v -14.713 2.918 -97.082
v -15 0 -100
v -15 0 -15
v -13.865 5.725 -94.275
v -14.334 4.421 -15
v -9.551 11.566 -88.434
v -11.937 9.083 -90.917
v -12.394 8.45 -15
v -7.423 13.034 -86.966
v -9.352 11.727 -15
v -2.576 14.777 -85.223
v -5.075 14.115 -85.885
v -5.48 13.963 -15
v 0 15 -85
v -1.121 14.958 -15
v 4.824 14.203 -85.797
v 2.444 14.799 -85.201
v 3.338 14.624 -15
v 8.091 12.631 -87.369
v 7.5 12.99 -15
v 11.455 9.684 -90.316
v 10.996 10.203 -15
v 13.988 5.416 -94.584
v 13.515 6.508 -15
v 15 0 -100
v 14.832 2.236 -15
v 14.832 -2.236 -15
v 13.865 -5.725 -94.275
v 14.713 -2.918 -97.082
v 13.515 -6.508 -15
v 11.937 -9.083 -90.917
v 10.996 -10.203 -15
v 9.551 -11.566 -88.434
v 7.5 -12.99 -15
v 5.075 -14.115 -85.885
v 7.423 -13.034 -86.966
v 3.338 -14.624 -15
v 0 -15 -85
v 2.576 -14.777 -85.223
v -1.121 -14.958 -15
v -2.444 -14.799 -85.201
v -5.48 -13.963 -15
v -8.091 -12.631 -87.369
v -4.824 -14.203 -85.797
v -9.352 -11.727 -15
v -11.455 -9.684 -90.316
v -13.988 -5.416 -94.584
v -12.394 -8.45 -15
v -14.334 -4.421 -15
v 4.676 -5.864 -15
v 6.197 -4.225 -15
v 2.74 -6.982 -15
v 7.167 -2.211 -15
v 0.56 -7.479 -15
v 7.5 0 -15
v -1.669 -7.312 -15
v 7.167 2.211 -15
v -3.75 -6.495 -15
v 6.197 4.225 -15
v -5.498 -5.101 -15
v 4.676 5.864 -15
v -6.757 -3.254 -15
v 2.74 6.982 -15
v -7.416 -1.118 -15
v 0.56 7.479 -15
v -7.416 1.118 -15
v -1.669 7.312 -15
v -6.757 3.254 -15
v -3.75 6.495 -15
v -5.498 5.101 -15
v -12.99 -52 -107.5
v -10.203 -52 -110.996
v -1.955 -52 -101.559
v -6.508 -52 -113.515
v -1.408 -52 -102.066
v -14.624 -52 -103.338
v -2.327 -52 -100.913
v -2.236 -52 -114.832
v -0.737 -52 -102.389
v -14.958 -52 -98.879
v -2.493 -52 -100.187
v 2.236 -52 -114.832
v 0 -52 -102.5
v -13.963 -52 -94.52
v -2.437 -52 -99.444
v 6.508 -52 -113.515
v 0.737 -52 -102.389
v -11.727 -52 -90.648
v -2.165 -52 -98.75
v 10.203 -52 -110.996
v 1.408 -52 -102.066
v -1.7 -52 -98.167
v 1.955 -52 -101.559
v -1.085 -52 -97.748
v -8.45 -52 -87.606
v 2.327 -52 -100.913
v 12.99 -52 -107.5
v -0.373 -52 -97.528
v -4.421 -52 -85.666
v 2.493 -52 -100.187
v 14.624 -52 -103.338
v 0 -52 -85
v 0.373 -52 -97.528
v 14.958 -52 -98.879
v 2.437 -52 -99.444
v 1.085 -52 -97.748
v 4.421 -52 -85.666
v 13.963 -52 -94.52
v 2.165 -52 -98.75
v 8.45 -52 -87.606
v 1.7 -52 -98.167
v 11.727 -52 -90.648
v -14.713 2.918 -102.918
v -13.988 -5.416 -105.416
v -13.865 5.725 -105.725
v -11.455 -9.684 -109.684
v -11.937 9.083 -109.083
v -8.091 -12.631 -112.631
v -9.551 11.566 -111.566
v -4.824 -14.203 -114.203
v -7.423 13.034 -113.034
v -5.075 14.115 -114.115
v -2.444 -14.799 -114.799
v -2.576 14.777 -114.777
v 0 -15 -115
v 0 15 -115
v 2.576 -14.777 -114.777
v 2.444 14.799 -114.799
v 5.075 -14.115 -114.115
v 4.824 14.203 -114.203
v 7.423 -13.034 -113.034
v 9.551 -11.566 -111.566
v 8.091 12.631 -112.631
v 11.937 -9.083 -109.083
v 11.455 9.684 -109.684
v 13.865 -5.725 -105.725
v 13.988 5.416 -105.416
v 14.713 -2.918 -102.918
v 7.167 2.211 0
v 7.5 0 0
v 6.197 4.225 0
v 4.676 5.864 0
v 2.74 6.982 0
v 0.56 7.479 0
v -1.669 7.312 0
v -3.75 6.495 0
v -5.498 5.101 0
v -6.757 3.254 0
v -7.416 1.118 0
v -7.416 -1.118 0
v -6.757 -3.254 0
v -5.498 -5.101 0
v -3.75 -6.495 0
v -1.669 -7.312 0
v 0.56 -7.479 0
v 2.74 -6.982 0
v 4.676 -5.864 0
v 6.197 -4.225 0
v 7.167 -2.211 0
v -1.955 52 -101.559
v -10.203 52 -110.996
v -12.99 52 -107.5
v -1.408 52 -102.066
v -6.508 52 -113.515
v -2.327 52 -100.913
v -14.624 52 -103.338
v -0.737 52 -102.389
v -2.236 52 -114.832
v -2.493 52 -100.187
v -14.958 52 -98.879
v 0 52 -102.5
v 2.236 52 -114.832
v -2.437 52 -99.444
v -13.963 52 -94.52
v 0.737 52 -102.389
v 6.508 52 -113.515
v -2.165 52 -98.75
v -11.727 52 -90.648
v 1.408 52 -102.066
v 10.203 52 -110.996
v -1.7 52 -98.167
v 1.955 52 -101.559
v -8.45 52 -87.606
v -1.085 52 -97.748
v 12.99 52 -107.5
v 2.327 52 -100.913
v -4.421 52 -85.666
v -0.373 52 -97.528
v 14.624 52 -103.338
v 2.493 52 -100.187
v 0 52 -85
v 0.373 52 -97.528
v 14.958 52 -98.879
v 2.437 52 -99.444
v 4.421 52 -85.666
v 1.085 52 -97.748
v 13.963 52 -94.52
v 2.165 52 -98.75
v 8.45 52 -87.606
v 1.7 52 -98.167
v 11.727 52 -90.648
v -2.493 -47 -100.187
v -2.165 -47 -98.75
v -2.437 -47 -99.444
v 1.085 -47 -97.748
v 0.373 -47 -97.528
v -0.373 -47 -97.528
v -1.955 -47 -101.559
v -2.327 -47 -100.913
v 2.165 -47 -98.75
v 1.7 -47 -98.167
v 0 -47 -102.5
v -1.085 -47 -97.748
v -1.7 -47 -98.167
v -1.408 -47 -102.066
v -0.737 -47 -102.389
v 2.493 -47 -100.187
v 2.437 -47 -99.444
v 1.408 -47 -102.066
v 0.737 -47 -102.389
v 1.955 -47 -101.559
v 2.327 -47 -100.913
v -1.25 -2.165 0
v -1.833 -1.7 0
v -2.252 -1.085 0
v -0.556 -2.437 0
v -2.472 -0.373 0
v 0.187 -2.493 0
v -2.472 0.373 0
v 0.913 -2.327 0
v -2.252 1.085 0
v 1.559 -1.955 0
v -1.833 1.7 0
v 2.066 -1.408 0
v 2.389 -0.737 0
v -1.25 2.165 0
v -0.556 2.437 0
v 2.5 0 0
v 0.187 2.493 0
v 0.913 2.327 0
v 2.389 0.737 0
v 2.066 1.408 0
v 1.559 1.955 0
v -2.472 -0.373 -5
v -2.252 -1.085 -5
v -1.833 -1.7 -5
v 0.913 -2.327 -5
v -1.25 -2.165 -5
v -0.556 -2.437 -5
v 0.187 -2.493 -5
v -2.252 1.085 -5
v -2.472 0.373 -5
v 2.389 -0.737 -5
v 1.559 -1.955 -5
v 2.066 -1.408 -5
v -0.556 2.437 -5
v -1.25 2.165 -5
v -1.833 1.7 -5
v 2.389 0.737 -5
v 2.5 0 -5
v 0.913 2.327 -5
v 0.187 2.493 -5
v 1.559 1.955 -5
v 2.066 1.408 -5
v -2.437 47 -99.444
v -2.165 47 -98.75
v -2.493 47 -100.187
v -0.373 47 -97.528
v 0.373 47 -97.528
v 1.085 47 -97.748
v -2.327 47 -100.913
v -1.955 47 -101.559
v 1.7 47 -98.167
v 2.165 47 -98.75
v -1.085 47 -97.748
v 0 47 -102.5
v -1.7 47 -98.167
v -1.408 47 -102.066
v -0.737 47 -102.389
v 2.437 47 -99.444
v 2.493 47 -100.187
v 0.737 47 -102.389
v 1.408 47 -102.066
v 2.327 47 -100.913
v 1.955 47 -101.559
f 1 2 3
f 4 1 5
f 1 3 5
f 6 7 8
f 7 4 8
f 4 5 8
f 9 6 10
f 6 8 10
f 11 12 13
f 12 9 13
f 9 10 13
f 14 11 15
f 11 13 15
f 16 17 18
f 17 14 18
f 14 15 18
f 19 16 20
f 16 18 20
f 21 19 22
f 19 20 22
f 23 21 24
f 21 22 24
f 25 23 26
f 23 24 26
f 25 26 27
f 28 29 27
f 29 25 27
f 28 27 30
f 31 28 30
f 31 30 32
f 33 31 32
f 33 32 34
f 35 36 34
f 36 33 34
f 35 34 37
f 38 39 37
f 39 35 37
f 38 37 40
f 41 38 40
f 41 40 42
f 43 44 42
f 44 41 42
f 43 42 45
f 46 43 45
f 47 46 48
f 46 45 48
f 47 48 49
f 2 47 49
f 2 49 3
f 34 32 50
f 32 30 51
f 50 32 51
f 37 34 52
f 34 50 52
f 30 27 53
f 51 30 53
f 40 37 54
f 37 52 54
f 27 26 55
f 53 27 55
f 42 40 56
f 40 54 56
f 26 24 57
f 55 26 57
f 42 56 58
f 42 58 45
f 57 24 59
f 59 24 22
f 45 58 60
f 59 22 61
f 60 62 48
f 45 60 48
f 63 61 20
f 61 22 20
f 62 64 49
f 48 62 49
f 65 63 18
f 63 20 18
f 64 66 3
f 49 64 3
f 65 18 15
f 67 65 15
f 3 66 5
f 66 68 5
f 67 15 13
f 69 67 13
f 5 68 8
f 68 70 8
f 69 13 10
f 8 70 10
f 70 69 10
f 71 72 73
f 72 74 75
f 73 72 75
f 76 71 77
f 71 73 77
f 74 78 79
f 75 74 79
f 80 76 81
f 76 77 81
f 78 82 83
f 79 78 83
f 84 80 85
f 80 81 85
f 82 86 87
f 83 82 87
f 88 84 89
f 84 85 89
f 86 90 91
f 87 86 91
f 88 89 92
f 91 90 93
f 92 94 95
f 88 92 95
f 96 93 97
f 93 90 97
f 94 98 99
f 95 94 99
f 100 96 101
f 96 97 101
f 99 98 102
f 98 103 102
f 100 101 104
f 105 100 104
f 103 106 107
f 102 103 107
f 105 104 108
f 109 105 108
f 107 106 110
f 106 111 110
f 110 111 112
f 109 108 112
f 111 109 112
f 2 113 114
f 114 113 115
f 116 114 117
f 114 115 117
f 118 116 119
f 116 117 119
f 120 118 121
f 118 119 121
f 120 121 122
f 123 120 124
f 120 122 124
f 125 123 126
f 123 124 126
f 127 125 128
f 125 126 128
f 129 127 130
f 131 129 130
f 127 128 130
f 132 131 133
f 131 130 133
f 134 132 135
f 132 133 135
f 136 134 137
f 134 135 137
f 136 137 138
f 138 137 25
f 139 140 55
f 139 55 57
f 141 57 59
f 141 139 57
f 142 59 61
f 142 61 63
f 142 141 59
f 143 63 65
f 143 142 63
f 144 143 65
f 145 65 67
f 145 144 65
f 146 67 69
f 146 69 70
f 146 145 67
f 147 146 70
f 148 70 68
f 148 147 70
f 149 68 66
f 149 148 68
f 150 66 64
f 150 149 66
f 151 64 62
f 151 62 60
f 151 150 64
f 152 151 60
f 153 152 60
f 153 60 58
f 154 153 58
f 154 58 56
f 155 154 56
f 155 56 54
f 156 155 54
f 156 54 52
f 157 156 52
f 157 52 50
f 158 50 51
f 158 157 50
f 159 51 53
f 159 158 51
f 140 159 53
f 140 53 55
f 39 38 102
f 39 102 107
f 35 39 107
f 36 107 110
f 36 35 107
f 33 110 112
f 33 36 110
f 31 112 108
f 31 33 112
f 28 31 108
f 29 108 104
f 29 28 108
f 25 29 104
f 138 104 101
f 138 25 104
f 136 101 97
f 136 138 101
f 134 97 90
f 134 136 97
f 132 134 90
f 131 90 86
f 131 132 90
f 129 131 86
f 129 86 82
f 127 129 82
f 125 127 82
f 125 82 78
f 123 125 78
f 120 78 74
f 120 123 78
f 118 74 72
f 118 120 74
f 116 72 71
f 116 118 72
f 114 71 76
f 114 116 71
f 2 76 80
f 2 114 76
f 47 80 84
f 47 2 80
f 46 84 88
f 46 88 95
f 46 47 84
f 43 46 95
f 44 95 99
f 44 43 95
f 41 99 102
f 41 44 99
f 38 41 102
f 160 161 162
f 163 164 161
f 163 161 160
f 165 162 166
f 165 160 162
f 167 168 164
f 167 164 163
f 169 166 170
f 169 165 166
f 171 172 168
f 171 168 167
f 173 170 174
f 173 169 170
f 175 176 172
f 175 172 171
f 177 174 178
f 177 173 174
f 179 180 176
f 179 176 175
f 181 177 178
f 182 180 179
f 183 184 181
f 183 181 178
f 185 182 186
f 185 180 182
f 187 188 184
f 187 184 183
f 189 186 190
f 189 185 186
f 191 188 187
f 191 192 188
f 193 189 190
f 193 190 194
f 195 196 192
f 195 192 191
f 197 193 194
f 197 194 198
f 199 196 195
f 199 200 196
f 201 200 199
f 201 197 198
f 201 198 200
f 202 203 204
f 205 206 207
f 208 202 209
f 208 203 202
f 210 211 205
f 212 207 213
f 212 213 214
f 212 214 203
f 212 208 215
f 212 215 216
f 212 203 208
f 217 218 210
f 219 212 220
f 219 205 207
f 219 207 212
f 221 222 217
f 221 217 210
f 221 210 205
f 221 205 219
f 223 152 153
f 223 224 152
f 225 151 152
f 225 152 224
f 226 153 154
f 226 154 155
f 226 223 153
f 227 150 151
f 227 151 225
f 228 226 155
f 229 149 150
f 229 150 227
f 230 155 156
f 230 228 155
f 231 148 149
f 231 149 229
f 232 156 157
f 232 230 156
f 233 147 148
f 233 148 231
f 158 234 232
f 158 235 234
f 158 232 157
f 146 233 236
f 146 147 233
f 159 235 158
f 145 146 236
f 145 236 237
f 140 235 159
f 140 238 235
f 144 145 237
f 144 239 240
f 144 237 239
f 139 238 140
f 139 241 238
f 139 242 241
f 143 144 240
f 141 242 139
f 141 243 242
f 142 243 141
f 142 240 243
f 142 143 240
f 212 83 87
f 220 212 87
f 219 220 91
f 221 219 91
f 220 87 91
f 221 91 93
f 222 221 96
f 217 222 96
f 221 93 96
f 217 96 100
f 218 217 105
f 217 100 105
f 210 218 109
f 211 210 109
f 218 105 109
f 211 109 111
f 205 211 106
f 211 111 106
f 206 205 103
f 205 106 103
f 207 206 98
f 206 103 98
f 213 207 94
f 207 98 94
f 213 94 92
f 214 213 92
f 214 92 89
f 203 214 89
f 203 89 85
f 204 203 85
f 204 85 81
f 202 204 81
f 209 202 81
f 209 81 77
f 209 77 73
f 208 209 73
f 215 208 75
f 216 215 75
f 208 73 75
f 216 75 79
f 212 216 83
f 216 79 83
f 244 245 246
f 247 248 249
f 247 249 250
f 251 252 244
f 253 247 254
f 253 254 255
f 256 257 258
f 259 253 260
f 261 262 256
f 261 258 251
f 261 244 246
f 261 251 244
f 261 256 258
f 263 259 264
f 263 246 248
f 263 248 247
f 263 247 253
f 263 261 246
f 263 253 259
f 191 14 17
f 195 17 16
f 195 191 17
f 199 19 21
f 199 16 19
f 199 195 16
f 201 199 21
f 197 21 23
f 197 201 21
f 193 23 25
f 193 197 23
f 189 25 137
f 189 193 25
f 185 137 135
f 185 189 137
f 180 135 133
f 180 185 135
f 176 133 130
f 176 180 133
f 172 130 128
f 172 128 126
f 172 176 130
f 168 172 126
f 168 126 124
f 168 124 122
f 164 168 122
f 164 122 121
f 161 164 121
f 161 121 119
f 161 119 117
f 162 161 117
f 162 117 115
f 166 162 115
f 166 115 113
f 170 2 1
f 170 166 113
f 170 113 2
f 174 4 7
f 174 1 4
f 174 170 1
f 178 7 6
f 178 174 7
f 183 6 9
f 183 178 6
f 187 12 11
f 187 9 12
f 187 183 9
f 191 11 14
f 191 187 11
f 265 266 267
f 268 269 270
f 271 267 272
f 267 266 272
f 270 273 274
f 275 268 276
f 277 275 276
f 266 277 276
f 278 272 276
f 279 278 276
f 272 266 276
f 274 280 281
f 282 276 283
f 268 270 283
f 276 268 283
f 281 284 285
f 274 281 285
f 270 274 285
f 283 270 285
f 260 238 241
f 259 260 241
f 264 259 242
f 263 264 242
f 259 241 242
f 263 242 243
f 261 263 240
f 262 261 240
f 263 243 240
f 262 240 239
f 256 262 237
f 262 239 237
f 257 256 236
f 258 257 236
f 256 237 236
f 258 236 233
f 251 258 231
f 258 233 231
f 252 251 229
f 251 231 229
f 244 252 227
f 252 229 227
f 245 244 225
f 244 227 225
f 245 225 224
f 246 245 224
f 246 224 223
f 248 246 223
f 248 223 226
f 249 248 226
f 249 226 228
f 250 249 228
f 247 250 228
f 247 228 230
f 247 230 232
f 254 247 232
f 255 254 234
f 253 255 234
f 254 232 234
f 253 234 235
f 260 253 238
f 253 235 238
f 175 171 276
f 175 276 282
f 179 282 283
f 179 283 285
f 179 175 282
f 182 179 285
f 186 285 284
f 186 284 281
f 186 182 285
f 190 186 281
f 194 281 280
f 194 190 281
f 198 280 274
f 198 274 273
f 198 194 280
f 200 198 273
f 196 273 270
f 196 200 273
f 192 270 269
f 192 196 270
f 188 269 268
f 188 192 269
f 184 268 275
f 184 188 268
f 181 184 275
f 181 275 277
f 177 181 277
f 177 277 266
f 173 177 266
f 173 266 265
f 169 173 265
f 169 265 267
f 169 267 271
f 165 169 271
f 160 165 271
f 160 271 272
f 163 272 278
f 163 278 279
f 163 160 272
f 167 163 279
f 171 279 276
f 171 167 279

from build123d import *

# Parameters (mm, degrees)
SKETCH1_R           = 7.5
BOSS_EXTRUDE1_DEPTH = 15
SKETCH7_R           = 2.5
CUT_EXTRUDE2_DEPTH  = 5
SKETCH2_R           = 15
BOSS_EXTRUDE2_DEPTH = 100
CUT_EXTRUDE3_DEPTH  = 52
SKETCH9_R           = 15
BOSS_EXTRUDE4_DEPTH = 52
SKETCH10_R          = 2.5
CUT_EXTRUDE4_DEPTH  = 5


with BuildPart() as part:
    # Sketch1 → Boss-Extrude1 (new body)
    with BuildSketch(Plane.XY):
        Circle(SKETCH1_R)
    extrude(amount=-BOSS_EXTRUDE1_DEPTH)

    # Sketch7 → Cut-Extrude2 (cut)
    with BuildSketch(Plane.XY):
        Circle(SKETCH7_R)
    extrude(amount=-CUT_EXTRUDE2_DEPTH, mode=Mode.SUBTRACT)

    # Sketch2 → Boss-Extrude2 (add)
    with BuildSketch(Plane(origin=(0, 0, -15), x_dir=(-1, 0, 0), z_dir=(0, 0, -1))):
        Circle(SKETCH2_R)
    extrude(amount=BOSS_EXTRUDE2_DEPTH)

    # Sketch8 → Cut-Extrude3 (cut, symmetric)
    with BuildSketch(Plane(origin=(0, 0, 0), x_dir=(1, 0, 0), z_dir=(0, 1, 0))):
        with BuildLine():
            Line((15, 165), (-15, 165))
            Line((-15, 165), (-15, 100))
            ThreePointArc((-15, 100), (0, 115), (15, 100))
            Line((15, 100), (15, 165))
        make_face()
    extrude(amount=CUT_EXTRUDE3_DEPTH, both=True, mode=Mode.SUBTRACT)

    # Sketch9 → Boss-Extrude4 (add, symmetric)
    with BuildSketch(Plane(origin=(0, 0, 0), x_dir=(1, 0, 0), z_dir=(0, 1, 0))):
        with Locations(Location((0, 100, 0), (0, 0, 270))):
            Circle(SKETCH9_R)
    extrude(amount=BOSS_EXTRUDE4_DEPTH, both=True)

    # Sketch10 → Cut-Extrude4 (cut)
    with BuildSketch(Plane.XZ.offset(52)):
        with Locations(Location((0, -100, 0), (0, 0, 270))):
            Circle(SKETCH10_R)
    cut_extrude4 = extrude(amount=-CUT_EXTRUDE4_DEPTH, mode=Mode.SUBTRACT)

    # Mirror1: Cut-Extrude4 across plane
    add(cut_extrude4.mirror(Plane.ZX), mode=Mode.SUBTRACT)


solid = part.part
